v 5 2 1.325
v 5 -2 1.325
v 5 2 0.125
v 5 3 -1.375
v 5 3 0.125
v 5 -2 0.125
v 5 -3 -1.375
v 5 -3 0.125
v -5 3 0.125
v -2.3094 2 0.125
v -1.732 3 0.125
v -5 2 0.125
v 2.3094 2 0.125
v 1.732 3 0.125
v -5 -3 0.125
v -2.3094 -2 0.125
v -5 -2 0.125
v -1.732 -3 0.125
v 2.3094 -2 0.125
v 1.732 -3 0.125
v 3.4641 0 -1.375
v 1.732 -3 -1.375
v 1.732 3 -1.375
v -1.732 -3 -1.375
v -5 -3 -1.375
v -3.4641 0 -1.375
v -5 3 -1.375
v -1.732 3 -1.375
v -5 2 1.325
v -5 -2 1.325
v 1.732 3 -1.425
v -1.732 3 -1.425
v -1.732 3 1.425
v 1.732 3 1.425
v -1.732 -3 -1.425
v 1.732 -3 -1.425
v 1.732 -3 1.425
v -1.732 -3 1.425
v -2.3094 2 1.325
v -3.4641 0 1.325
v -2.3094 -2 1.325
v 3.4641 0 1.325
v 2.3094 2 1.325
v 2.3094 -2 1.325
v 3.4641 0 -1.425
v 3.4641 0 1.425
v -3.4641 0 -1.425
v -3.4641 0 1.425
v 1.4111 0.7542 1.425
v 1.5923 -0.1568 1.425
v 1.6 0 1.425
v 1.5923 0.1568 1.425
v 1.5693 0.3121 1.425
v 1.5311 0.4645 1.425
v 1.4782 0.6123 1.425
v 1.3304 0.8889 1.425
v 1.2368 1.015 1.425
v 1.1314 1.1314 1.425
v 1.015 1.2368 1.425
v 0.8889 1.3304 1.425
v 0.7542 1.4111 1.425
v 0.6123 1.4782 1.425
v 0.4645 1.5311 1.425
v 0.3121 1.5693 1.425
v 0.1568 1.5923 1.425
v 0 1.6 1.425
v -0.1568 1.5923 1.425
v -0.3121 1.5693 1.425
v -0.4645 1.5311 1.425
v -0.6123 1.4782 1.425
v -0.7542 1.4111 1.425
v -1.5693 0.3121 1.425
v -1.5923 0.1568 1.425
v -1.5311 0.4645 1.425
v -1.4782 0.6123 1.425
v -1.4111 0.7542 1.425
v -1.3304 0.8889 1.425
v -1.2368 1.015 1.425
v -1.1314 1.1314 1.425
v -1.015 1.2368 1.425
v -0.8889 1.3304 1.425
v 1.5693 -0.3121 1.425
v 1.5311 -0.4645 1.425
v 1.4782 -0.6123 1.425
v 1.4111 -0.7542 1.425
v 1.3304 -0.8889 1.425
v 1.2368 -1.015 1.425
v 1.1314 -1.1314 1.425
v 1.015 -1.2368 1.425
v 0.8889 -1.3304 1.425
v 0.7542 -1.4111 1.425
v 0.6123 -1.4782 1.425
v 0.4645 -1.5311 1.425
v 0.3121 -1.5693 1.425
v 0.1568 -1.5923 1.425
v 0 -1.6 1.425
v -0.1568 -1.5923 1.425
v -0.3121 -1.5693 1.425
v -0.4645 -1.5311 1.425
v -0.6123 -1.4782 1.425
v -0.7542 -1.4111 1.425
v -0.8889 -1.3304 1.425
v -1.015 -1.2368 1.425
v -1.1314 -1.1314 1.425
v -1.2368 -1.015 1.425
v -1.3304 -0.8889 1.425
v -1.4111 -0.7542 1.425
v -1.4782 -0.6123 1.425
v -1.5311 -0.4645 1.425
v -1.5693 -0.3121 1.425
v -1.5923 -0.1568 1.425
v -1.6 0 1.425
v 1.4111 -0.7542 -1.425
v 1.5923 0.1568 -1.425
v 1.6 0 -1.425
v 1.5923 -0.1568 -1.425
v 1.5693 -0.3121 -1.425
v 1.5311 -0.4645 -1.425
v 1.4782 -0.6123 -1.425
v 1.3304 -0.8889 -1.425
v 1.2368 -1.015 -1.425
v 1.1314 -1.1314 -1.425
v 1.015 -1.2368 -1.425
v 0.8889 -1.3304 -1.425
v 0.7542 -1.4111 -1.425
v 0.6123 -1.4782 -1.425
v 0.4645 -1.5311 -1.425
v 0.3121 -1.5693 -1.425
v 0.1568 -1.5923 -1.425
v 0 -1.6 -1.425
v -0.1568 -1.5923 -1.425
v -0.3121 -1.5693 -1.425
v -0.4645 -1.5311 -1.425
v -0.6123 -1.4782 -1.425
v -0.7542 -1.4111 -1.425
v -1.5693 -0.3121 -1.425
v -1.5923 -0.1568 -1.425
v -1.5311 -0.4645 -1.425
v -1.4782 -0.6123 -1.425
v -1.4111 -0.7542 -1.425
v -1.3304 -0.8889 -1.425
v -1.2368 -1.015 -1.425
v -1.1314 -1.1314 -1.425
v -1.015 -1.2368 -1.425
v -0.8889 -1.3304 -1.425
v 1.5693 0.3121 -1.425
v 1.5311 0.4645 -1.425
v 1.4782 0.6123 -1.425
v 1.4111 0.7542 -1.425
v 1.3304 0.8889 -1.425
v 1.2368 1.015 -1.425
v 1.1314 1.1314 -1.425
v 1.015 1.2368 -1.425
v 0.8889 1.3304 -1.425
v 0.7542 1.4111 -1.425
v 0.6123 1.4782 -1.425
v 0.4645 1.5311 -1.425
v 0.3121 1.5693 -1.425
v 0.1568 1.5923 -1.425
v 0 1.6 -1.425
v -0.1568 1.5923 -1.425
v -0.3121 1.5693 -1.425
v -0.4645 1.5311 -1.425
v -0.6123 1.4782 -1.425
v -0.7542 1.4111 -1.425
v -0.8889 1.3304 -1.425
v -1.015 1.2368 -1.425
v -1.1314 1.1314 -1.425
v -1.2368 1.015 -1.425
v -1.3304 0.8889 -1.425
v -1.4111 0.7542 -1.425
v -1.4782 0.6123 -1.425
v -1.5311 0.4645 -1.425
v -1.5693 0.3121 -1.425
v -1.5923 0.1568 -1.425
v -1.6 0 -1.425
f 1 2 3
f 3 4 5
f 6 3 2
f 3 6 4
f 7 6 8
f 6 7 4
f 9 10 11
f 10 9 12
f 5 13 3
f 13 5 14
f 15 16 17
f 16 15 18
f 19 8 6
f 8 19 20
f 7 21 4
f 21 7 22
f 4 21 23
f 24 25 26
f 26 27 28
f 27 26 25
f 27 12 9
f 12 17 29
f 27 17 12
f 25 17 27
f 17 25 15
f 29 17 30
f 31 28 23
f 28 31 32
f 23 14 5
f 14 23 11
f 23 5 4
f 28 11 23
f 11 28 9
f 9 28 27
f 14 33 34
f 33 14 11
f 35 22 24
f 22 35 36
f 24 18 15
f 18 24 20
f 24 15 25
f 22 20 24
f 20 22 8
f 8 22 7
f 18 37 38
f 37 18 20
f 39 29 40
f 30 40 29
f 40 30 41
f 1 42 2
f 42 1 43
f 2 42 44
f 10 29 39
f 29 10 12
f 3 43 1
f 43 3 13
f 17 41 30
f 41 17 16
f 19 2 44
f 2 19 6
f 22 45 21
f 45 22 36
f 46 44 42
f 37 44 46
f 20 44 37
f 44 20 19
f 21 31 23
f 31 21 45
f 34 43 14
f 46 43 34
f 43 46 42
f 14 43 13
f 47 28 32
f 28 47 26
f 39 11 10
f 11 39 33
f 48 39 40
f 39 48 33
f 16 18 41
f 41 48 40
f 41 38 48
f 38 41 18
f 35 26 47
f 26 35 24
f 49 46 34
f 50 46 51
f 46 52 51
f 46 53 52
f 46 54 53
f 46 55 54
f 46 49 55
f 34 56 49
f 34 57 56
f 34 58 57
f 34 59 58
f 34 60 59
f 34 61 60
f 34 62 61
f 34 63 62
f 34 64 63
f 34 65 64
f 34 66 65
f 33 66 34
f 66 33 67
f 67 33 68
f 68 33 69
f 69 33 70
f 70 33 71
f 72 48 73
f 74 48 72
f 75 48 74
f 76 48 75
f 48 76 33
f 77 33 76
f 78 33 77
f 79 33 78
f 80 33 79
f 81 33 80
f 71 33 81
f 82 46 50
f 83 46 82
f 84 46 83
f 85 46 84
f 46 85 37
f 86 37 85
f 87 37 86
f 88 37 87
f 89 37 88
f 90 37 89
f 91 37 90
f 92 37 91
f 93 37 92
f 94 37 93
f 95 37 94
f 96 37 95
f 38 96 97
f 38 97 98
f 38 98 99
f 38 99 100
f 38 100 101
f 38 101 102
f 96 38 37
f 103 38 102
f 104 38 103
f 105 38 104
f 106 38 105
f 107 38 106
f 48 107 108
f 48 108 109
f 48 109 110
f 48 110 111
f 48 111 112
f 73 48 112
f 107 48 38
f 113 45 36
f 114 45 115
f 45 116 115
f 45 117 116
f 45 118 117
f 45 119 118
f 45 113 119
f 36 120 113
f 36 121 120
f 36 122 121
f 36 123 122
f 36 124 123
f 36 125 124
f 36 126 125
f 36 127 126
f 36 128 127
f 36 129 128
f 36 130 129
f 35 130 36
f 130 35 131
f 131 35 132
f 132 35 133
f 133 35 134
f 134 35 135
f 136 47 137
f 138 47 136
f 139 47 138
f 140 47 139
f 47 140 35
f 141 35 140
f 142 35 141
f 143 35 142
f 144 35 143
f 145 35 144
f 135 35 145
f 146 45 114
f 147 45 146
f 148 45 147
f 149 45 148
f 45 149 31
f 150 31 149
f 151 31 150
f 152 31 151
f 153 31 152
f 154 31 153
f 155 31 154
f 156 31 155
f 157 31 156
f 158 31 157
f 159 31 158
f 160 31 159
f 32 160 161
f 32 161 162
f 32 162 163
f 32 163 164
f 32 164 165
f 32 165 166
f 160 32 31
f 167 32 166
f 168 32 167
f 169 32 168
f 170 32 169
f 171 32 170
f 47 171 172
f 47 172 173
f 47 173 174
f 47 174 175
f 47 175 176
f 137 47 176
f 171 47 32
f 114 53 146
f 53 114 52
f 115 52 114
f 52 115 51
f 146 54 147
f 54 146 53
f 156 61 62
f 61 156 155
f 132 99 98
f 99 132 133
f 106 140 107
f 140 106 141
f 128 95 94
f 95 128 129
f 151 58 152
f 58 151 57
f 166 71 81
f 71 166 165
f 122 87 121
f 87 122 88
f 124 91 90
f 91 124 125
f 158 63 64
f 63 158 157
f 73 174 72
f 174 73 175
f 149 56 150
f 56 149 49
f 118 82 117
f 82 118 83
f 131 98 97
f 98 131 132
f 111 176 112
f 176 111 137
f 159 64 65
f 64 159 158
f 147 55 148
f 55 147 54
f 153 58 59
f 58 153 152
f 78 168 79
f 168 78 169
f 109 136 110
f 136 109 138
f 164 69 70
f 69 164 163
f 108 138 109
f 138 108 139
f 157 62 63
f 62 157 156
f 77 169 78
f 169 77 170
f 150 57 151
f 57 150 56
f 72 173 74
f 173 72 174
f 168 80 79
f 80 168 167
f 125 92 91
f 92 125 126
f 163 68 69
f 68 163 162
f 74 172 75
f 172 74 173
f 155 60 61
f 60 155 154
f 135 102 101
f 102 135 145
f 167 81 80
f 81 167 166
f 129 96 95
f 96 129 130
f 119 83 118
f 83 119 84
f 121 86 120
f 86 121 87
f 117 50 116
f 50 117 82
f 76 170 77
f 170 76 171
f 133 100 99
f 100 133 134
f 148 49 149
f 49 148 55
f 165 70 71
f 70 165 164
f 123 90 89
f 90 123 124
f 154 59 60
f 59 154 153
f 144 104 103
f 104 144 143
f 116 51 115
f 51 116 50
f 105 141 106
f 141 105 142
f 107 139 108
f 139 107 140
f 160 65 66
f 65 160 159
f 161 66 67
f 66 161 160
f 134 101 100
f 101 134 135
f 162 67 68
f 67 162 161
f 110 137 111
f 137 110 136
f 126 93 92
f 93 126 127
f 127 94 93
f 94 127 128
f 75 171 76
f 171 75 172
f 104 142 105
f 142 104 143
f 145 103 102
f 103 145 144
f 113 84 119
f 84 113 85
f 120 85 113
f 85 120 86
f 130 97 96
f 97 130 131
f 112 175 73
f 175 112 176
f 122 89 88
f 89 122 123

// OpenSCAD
$fn = 96;

// T-slot nut for 3.0mm screws (mm)
screw_d = 3.0;
hole_d  = 3.2;          // clearance for M3
across_flats = 6.0;     // hex across flats
thickness = 2.75;       // total thickness

// Generic T-slot nut proportions (adjust to your extrusion slot if needed)
slot_w = 6.0;           // base width (inside-slot capture)
slot_l = 10.0;          // base length (along slot)
neck_w = 4.0;           // neck width (fits slot opening)
neck_l = slot_l;        // neck length
neck_h = 1.25;          // neck height
base_h = thickness - neck_h;

// Derived
hex_R = across_flats / sqrt(3); // circumradius for hex with given across-flats
eps = 0.05;

module hex_prism(h, r) {
    cylinder(h = h, r = r, $fn = 6, center = true);
}

difference() {
    union() {
        // Base block: centered at Z=0
        translate([0, 0, -thickness/2 + base_h/2])
            cube([slot_l, slot_w, base_h], center = true);

        // Neck block: sits on top of base, overlaps slightly to ensure connectivity
        translate([0, 0, -thickness/2 + base_h + neck_h/2 - eps])
            cube([neck_l, neck_w, neck_h], center = true);

        // Hex boss: same overall thickness, centered at Z=0 (ensures 6.0mm across flats)
        // Slight overlap into neck to guarantee one connected solid
        translate([0, 0, 0])
            hex_prism(thickness + 2*eps, hex_R);
    }

    // Through-hole for 3.0mm screw (clearance)
    cylinder(h = thickness + 2, d = hole_d, center = true, $fn = 64);
}
